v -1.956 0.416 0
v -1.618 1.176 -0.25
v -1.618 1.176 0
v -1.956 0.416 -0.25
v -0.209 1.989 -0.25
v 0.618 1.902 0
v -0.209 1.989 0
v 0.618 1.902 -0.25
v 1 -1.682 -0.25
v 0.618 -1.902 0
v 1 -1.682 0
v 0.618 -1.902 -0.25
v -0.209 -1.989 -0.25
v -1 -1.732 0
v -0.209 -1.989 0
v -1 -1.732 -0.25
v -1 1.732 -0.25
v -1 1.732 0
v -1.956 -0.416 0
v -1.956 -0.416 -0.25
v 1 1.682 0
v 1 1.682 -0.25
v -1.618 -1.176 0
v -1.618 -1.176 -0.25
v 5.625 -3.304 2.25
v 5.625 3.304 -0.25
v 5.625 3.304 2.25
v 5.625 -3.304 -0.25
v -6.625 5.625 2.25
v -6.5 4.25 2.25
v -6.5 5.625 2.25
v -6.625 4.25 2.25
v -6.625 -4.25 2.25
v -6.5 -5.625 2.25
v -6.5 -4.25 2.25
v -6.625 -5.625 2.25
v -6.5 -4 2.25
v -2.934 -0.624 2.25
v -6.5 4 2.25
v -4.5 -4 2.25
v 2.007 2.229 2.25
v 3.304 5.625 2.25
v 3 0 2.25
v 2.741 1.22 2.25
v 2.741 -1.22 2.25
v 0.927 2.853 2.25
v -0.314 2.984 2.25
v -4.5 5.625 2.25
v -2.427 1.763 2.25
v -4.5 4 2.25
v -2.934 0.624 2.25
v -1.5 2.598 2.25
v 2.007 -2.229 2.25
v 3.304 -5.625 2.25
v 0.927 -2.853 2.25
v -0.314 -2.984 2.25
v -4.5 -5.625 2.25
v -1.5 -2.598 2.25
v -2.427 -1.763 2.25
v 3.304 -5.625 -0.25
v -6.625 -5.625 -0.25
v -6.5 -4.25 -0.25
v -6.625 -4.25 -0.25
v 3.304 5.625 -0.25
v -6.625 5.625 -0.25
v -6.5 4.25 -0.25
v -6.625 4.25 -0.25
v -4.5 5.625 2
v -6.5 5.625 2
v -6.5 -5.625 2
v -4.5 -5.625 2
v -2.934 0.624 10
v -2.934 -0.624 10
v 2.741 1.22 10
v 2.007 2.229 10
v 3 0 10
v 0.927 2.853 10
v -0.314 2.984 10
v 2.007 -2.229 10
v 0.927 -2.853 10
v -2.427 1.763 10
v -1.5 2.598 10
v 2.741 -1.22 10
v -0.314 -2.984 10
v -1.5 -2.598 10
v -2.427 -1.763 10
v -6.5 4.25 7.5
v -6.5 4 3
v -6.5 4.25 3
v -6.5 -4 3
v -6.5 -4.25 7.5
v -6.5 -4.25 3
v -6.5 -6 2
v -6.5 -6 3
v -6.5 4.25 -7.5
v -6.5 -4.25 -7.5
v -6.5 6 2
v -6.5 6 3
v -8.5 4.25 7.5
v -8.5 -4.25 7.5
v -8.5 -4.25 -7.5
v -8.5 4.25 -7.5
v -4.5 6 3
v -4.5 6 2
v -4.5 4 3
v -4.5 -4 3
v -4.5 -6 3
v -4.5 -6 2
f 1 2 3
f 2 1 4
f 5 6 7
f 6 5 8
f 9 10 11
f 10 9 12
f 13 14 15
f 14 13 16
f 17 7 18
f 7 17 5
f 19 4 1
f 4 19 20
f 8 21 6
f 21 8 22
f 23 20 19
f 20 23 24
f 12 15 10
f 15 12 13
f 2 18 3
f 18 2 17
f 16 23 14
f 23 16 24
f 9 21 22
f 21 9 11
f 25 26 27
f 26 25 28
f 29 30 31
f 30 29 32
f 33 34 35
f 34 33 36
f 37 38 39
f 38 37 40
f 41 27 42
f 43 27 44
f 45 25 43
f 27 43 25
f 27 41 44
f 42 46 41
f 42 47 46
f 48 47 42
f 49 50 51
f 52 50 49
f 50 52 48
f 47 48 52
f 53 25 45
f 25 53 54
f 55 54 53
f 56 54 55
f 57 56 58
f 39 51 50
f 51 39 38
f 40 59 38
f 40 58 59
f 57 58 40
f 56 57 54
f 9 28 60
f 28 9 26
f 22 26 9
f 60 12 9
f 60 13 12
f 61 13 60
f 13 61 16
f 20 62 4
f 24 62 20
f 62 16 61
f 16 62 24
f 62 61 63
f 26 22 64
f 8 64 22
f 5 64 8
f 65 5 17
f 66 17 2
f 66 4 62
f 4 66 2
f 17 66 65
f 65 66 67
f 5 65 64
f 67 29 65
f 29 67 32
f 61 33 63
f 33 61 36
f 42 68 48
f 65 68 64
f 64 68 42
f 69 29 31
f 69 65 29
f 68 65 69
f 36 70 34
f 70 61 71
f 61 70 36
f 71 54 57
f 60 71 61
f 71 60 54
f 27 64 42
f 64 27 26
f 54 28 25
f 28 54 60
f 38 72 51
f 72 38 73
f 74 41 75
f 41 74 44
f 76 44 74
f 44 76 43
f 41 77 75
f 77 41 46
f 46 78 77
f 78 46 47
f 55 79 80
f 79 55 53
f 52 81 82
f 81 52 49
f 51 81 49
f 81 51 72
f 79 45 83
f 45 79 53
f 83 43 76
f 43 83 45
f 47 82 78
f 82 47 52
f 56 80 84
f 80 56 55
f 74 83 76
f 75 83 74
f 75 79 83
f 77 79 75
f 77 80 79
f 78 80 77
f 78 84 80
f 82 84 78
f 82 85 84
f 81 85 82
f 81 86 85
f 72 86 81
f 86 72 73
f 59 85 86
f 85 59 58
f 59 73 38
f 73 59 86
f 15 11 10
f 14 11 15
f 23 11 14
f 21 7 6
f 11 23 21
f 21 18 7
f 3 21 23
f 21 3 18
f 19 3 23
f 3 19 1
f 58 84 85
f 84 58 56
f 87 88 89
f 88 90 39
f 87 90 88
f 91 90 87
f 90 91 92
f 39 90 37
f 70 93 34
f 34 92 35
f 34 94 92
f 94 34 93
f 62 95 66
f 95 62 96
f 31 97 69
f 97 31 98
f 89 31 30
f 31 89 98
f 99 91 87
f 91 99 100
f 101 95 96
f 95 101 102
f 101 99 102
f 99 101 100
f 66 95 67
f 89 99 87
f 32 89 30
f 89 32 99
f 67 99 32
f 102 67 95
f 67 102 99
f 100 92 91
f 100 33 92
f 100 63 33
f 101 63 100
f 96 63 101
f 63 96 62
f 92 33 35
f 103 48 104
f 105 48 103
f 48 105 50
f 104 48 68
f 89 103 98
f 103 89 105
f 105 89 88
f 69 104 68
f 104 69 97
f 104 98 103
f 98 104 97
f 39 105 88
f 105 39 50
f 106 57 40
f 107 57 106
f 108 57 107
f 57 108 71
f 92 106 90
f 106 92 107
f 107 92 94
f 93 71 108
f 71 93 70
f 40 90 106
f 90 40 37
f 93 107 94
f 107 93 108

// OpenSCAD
//rotationSensor();
rotationSensorSpacing();
//roatationSensorBody(true);
//roatationSensorBody(false);

module rotationSensor(){
	//Digi-Key Part Number: 490-2400-ND
	//Manufacturer Part Number: SV01A103AEA01B00
	
	roatationSensorBody();
	
	translate([-6.5, -2.5, -0.6])
		cube([1.5, 0.8, 0.2], center = true);
		
	translate([-6.5, 0, -0.6])
		cube([1.5, 0.8, 0.2], center = true);		
		
	translate([-6.5, 2.5, -0.6])
		cube([1.5, 0.8, 0.2], center = true);		
		
	translate([6.5, 0, -0.6])
		cube([1.5, 0.8, 0.2], center = true);				
}

module roatationSensorBody(inflate = false) {
	x1 = inflate ? 0.25 : 0;
	x2 = inflate ? 0.25 : 0;
	x3 = inflate ? 0.5 : 0;

	difference()
	{
		translate([-0.5, 0, 0]) 
			cube ([12 + x1, 11 + x1, 2 + x3], center = true);
		
		difference() 
		{
			cylinder(h = 5, d = 4, center = true, $fn = 15);
			translate([3, 0, 0]) cube([4, 4, 4], center = true);
		}
		
		translate([8 + x2, 7.5 + x2, 0])
		rotate([0, 0, 45]) 
			cube([10, 10, 5], center = true);
		
		translate([8 + x2, -7.5 - x2, 0])
		rotate([0, 0, -45]) 
			cube([10, 10, 5], center = true);		
	}
}

module rotationSensorSpacing() {
	translate([0, 0, 1])
		roatationSensorBody(inflate = true);
	
	cylinder(h = 10, d = 6, $fn = 15);
	
	translate([-7.5, 0, 0])
		cube ([2, 8.5, 15], center = true);

	translate([-5.5, 5, 2.5])
		cube ([2, 2, 1], center = true);
		
	translate([-5.5, -5, 2.5])
		cube ([2, 2, 1], center = true);
}
